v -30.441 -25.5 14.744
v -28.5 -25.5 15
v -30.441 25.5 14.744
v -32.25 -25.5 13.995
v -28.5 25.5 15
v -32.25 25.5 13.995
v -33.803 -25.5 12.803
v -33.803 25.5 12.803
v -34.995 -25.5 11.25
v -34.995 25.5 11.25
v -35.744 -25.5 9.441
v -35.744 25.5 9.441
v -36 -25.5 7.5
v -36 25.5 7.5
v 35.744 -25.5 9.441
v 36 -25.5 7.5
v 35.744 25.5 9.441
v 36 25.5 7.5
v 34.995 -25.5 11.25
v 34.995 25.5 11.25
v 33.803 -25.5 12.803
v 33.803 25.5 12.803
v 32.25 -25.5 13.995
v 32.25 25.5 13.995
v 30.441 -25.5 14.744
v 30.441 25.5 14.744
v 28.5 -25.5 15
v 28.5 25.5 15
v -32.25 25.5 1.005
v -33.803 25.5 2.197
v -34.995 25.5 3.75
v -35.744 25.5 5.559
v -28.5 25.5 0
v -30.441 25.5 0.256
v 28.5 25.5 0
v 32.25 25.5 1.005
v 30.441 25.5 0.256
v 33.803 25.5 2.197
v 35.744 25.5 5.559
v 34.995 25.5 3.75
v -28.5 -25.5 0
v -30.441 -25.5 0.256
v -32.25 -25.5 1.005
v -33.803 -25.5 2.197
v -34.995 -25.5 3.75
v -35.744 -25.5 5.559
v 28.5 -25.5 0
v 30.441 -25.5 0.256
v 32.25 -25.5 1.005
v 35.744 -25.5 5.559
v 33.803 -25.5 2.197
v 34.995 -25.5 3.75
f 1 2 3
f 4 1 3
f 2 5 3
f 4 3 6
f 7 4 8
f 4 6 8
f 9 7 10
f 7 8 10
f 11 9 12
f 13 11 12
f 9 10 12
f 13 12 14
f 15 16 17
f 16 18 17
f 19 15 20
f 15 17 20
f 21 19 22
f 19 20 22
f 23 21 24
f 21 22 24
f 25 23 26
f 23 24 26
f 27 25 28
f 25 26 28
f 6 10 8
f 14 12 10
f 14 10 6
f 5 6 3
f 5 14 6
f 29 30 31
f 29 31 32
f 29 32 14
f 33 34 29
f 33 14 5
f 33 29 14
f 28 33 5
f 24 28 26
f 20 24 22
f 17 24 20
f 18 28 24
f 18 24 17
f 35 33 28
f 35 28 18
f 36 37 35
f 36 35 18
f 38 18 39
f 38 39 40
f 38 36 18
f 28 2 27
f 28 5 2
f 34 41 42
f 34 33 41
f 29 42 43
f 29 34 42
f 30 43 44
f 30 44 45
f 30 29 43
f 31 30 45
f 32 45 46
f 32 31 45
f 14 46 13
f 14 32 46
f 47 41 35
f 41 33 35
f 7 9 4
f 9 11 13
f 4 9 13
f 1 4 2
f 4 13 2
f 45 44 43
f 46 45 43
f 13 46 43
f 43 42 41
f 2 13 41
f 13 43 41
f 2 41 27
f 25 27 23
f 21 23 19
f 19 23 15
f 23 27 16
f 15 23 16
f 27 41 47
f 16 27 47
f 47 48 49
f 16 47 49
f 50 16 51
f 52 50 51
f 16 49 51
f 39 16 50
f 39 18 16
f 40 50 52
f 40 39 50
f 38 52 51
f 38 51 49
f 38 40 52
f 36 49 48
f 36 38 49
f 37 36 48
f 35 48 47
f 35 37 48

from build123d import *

# Parameters (mm, degrees)
SKETCH1_W           = 72
SKETCH1_H           = 51
BOSS_EXTRUDE1_DEPTH = 15
FILLET2_R           = 7.5
FILLET3_R           = 7.5


with BuildPart() as part:
    # Sketch1 → Boss-Extrude1 (new body)
    with BuildSketch(Plane.XY):
        Rectangle(SKETCH1_W, SKETCH1_H)
    extrude(amount=BOSS_EXTRUDE1_DEPTH)

    # Fillet2
    fillet2_edges = [part.edges().sort_by_distance(p)[0] for p in [
        (36, 0, 15),
    ]]
    fillet(fillet2_edges, radius=FILLET2_R)

    # Fillet3
    fillet3_edges = [part.edges().sort_by_distance(p)[0] for p in [
        (-36, 0, 15),
        (-36, 0, 0),
        (36, 0, 0),
    ]]
    fillet(fillet3_edges, radius=FILLET3_R - 0.0001)  # a hair under: the kernel refuses the full size


solid = part.part
